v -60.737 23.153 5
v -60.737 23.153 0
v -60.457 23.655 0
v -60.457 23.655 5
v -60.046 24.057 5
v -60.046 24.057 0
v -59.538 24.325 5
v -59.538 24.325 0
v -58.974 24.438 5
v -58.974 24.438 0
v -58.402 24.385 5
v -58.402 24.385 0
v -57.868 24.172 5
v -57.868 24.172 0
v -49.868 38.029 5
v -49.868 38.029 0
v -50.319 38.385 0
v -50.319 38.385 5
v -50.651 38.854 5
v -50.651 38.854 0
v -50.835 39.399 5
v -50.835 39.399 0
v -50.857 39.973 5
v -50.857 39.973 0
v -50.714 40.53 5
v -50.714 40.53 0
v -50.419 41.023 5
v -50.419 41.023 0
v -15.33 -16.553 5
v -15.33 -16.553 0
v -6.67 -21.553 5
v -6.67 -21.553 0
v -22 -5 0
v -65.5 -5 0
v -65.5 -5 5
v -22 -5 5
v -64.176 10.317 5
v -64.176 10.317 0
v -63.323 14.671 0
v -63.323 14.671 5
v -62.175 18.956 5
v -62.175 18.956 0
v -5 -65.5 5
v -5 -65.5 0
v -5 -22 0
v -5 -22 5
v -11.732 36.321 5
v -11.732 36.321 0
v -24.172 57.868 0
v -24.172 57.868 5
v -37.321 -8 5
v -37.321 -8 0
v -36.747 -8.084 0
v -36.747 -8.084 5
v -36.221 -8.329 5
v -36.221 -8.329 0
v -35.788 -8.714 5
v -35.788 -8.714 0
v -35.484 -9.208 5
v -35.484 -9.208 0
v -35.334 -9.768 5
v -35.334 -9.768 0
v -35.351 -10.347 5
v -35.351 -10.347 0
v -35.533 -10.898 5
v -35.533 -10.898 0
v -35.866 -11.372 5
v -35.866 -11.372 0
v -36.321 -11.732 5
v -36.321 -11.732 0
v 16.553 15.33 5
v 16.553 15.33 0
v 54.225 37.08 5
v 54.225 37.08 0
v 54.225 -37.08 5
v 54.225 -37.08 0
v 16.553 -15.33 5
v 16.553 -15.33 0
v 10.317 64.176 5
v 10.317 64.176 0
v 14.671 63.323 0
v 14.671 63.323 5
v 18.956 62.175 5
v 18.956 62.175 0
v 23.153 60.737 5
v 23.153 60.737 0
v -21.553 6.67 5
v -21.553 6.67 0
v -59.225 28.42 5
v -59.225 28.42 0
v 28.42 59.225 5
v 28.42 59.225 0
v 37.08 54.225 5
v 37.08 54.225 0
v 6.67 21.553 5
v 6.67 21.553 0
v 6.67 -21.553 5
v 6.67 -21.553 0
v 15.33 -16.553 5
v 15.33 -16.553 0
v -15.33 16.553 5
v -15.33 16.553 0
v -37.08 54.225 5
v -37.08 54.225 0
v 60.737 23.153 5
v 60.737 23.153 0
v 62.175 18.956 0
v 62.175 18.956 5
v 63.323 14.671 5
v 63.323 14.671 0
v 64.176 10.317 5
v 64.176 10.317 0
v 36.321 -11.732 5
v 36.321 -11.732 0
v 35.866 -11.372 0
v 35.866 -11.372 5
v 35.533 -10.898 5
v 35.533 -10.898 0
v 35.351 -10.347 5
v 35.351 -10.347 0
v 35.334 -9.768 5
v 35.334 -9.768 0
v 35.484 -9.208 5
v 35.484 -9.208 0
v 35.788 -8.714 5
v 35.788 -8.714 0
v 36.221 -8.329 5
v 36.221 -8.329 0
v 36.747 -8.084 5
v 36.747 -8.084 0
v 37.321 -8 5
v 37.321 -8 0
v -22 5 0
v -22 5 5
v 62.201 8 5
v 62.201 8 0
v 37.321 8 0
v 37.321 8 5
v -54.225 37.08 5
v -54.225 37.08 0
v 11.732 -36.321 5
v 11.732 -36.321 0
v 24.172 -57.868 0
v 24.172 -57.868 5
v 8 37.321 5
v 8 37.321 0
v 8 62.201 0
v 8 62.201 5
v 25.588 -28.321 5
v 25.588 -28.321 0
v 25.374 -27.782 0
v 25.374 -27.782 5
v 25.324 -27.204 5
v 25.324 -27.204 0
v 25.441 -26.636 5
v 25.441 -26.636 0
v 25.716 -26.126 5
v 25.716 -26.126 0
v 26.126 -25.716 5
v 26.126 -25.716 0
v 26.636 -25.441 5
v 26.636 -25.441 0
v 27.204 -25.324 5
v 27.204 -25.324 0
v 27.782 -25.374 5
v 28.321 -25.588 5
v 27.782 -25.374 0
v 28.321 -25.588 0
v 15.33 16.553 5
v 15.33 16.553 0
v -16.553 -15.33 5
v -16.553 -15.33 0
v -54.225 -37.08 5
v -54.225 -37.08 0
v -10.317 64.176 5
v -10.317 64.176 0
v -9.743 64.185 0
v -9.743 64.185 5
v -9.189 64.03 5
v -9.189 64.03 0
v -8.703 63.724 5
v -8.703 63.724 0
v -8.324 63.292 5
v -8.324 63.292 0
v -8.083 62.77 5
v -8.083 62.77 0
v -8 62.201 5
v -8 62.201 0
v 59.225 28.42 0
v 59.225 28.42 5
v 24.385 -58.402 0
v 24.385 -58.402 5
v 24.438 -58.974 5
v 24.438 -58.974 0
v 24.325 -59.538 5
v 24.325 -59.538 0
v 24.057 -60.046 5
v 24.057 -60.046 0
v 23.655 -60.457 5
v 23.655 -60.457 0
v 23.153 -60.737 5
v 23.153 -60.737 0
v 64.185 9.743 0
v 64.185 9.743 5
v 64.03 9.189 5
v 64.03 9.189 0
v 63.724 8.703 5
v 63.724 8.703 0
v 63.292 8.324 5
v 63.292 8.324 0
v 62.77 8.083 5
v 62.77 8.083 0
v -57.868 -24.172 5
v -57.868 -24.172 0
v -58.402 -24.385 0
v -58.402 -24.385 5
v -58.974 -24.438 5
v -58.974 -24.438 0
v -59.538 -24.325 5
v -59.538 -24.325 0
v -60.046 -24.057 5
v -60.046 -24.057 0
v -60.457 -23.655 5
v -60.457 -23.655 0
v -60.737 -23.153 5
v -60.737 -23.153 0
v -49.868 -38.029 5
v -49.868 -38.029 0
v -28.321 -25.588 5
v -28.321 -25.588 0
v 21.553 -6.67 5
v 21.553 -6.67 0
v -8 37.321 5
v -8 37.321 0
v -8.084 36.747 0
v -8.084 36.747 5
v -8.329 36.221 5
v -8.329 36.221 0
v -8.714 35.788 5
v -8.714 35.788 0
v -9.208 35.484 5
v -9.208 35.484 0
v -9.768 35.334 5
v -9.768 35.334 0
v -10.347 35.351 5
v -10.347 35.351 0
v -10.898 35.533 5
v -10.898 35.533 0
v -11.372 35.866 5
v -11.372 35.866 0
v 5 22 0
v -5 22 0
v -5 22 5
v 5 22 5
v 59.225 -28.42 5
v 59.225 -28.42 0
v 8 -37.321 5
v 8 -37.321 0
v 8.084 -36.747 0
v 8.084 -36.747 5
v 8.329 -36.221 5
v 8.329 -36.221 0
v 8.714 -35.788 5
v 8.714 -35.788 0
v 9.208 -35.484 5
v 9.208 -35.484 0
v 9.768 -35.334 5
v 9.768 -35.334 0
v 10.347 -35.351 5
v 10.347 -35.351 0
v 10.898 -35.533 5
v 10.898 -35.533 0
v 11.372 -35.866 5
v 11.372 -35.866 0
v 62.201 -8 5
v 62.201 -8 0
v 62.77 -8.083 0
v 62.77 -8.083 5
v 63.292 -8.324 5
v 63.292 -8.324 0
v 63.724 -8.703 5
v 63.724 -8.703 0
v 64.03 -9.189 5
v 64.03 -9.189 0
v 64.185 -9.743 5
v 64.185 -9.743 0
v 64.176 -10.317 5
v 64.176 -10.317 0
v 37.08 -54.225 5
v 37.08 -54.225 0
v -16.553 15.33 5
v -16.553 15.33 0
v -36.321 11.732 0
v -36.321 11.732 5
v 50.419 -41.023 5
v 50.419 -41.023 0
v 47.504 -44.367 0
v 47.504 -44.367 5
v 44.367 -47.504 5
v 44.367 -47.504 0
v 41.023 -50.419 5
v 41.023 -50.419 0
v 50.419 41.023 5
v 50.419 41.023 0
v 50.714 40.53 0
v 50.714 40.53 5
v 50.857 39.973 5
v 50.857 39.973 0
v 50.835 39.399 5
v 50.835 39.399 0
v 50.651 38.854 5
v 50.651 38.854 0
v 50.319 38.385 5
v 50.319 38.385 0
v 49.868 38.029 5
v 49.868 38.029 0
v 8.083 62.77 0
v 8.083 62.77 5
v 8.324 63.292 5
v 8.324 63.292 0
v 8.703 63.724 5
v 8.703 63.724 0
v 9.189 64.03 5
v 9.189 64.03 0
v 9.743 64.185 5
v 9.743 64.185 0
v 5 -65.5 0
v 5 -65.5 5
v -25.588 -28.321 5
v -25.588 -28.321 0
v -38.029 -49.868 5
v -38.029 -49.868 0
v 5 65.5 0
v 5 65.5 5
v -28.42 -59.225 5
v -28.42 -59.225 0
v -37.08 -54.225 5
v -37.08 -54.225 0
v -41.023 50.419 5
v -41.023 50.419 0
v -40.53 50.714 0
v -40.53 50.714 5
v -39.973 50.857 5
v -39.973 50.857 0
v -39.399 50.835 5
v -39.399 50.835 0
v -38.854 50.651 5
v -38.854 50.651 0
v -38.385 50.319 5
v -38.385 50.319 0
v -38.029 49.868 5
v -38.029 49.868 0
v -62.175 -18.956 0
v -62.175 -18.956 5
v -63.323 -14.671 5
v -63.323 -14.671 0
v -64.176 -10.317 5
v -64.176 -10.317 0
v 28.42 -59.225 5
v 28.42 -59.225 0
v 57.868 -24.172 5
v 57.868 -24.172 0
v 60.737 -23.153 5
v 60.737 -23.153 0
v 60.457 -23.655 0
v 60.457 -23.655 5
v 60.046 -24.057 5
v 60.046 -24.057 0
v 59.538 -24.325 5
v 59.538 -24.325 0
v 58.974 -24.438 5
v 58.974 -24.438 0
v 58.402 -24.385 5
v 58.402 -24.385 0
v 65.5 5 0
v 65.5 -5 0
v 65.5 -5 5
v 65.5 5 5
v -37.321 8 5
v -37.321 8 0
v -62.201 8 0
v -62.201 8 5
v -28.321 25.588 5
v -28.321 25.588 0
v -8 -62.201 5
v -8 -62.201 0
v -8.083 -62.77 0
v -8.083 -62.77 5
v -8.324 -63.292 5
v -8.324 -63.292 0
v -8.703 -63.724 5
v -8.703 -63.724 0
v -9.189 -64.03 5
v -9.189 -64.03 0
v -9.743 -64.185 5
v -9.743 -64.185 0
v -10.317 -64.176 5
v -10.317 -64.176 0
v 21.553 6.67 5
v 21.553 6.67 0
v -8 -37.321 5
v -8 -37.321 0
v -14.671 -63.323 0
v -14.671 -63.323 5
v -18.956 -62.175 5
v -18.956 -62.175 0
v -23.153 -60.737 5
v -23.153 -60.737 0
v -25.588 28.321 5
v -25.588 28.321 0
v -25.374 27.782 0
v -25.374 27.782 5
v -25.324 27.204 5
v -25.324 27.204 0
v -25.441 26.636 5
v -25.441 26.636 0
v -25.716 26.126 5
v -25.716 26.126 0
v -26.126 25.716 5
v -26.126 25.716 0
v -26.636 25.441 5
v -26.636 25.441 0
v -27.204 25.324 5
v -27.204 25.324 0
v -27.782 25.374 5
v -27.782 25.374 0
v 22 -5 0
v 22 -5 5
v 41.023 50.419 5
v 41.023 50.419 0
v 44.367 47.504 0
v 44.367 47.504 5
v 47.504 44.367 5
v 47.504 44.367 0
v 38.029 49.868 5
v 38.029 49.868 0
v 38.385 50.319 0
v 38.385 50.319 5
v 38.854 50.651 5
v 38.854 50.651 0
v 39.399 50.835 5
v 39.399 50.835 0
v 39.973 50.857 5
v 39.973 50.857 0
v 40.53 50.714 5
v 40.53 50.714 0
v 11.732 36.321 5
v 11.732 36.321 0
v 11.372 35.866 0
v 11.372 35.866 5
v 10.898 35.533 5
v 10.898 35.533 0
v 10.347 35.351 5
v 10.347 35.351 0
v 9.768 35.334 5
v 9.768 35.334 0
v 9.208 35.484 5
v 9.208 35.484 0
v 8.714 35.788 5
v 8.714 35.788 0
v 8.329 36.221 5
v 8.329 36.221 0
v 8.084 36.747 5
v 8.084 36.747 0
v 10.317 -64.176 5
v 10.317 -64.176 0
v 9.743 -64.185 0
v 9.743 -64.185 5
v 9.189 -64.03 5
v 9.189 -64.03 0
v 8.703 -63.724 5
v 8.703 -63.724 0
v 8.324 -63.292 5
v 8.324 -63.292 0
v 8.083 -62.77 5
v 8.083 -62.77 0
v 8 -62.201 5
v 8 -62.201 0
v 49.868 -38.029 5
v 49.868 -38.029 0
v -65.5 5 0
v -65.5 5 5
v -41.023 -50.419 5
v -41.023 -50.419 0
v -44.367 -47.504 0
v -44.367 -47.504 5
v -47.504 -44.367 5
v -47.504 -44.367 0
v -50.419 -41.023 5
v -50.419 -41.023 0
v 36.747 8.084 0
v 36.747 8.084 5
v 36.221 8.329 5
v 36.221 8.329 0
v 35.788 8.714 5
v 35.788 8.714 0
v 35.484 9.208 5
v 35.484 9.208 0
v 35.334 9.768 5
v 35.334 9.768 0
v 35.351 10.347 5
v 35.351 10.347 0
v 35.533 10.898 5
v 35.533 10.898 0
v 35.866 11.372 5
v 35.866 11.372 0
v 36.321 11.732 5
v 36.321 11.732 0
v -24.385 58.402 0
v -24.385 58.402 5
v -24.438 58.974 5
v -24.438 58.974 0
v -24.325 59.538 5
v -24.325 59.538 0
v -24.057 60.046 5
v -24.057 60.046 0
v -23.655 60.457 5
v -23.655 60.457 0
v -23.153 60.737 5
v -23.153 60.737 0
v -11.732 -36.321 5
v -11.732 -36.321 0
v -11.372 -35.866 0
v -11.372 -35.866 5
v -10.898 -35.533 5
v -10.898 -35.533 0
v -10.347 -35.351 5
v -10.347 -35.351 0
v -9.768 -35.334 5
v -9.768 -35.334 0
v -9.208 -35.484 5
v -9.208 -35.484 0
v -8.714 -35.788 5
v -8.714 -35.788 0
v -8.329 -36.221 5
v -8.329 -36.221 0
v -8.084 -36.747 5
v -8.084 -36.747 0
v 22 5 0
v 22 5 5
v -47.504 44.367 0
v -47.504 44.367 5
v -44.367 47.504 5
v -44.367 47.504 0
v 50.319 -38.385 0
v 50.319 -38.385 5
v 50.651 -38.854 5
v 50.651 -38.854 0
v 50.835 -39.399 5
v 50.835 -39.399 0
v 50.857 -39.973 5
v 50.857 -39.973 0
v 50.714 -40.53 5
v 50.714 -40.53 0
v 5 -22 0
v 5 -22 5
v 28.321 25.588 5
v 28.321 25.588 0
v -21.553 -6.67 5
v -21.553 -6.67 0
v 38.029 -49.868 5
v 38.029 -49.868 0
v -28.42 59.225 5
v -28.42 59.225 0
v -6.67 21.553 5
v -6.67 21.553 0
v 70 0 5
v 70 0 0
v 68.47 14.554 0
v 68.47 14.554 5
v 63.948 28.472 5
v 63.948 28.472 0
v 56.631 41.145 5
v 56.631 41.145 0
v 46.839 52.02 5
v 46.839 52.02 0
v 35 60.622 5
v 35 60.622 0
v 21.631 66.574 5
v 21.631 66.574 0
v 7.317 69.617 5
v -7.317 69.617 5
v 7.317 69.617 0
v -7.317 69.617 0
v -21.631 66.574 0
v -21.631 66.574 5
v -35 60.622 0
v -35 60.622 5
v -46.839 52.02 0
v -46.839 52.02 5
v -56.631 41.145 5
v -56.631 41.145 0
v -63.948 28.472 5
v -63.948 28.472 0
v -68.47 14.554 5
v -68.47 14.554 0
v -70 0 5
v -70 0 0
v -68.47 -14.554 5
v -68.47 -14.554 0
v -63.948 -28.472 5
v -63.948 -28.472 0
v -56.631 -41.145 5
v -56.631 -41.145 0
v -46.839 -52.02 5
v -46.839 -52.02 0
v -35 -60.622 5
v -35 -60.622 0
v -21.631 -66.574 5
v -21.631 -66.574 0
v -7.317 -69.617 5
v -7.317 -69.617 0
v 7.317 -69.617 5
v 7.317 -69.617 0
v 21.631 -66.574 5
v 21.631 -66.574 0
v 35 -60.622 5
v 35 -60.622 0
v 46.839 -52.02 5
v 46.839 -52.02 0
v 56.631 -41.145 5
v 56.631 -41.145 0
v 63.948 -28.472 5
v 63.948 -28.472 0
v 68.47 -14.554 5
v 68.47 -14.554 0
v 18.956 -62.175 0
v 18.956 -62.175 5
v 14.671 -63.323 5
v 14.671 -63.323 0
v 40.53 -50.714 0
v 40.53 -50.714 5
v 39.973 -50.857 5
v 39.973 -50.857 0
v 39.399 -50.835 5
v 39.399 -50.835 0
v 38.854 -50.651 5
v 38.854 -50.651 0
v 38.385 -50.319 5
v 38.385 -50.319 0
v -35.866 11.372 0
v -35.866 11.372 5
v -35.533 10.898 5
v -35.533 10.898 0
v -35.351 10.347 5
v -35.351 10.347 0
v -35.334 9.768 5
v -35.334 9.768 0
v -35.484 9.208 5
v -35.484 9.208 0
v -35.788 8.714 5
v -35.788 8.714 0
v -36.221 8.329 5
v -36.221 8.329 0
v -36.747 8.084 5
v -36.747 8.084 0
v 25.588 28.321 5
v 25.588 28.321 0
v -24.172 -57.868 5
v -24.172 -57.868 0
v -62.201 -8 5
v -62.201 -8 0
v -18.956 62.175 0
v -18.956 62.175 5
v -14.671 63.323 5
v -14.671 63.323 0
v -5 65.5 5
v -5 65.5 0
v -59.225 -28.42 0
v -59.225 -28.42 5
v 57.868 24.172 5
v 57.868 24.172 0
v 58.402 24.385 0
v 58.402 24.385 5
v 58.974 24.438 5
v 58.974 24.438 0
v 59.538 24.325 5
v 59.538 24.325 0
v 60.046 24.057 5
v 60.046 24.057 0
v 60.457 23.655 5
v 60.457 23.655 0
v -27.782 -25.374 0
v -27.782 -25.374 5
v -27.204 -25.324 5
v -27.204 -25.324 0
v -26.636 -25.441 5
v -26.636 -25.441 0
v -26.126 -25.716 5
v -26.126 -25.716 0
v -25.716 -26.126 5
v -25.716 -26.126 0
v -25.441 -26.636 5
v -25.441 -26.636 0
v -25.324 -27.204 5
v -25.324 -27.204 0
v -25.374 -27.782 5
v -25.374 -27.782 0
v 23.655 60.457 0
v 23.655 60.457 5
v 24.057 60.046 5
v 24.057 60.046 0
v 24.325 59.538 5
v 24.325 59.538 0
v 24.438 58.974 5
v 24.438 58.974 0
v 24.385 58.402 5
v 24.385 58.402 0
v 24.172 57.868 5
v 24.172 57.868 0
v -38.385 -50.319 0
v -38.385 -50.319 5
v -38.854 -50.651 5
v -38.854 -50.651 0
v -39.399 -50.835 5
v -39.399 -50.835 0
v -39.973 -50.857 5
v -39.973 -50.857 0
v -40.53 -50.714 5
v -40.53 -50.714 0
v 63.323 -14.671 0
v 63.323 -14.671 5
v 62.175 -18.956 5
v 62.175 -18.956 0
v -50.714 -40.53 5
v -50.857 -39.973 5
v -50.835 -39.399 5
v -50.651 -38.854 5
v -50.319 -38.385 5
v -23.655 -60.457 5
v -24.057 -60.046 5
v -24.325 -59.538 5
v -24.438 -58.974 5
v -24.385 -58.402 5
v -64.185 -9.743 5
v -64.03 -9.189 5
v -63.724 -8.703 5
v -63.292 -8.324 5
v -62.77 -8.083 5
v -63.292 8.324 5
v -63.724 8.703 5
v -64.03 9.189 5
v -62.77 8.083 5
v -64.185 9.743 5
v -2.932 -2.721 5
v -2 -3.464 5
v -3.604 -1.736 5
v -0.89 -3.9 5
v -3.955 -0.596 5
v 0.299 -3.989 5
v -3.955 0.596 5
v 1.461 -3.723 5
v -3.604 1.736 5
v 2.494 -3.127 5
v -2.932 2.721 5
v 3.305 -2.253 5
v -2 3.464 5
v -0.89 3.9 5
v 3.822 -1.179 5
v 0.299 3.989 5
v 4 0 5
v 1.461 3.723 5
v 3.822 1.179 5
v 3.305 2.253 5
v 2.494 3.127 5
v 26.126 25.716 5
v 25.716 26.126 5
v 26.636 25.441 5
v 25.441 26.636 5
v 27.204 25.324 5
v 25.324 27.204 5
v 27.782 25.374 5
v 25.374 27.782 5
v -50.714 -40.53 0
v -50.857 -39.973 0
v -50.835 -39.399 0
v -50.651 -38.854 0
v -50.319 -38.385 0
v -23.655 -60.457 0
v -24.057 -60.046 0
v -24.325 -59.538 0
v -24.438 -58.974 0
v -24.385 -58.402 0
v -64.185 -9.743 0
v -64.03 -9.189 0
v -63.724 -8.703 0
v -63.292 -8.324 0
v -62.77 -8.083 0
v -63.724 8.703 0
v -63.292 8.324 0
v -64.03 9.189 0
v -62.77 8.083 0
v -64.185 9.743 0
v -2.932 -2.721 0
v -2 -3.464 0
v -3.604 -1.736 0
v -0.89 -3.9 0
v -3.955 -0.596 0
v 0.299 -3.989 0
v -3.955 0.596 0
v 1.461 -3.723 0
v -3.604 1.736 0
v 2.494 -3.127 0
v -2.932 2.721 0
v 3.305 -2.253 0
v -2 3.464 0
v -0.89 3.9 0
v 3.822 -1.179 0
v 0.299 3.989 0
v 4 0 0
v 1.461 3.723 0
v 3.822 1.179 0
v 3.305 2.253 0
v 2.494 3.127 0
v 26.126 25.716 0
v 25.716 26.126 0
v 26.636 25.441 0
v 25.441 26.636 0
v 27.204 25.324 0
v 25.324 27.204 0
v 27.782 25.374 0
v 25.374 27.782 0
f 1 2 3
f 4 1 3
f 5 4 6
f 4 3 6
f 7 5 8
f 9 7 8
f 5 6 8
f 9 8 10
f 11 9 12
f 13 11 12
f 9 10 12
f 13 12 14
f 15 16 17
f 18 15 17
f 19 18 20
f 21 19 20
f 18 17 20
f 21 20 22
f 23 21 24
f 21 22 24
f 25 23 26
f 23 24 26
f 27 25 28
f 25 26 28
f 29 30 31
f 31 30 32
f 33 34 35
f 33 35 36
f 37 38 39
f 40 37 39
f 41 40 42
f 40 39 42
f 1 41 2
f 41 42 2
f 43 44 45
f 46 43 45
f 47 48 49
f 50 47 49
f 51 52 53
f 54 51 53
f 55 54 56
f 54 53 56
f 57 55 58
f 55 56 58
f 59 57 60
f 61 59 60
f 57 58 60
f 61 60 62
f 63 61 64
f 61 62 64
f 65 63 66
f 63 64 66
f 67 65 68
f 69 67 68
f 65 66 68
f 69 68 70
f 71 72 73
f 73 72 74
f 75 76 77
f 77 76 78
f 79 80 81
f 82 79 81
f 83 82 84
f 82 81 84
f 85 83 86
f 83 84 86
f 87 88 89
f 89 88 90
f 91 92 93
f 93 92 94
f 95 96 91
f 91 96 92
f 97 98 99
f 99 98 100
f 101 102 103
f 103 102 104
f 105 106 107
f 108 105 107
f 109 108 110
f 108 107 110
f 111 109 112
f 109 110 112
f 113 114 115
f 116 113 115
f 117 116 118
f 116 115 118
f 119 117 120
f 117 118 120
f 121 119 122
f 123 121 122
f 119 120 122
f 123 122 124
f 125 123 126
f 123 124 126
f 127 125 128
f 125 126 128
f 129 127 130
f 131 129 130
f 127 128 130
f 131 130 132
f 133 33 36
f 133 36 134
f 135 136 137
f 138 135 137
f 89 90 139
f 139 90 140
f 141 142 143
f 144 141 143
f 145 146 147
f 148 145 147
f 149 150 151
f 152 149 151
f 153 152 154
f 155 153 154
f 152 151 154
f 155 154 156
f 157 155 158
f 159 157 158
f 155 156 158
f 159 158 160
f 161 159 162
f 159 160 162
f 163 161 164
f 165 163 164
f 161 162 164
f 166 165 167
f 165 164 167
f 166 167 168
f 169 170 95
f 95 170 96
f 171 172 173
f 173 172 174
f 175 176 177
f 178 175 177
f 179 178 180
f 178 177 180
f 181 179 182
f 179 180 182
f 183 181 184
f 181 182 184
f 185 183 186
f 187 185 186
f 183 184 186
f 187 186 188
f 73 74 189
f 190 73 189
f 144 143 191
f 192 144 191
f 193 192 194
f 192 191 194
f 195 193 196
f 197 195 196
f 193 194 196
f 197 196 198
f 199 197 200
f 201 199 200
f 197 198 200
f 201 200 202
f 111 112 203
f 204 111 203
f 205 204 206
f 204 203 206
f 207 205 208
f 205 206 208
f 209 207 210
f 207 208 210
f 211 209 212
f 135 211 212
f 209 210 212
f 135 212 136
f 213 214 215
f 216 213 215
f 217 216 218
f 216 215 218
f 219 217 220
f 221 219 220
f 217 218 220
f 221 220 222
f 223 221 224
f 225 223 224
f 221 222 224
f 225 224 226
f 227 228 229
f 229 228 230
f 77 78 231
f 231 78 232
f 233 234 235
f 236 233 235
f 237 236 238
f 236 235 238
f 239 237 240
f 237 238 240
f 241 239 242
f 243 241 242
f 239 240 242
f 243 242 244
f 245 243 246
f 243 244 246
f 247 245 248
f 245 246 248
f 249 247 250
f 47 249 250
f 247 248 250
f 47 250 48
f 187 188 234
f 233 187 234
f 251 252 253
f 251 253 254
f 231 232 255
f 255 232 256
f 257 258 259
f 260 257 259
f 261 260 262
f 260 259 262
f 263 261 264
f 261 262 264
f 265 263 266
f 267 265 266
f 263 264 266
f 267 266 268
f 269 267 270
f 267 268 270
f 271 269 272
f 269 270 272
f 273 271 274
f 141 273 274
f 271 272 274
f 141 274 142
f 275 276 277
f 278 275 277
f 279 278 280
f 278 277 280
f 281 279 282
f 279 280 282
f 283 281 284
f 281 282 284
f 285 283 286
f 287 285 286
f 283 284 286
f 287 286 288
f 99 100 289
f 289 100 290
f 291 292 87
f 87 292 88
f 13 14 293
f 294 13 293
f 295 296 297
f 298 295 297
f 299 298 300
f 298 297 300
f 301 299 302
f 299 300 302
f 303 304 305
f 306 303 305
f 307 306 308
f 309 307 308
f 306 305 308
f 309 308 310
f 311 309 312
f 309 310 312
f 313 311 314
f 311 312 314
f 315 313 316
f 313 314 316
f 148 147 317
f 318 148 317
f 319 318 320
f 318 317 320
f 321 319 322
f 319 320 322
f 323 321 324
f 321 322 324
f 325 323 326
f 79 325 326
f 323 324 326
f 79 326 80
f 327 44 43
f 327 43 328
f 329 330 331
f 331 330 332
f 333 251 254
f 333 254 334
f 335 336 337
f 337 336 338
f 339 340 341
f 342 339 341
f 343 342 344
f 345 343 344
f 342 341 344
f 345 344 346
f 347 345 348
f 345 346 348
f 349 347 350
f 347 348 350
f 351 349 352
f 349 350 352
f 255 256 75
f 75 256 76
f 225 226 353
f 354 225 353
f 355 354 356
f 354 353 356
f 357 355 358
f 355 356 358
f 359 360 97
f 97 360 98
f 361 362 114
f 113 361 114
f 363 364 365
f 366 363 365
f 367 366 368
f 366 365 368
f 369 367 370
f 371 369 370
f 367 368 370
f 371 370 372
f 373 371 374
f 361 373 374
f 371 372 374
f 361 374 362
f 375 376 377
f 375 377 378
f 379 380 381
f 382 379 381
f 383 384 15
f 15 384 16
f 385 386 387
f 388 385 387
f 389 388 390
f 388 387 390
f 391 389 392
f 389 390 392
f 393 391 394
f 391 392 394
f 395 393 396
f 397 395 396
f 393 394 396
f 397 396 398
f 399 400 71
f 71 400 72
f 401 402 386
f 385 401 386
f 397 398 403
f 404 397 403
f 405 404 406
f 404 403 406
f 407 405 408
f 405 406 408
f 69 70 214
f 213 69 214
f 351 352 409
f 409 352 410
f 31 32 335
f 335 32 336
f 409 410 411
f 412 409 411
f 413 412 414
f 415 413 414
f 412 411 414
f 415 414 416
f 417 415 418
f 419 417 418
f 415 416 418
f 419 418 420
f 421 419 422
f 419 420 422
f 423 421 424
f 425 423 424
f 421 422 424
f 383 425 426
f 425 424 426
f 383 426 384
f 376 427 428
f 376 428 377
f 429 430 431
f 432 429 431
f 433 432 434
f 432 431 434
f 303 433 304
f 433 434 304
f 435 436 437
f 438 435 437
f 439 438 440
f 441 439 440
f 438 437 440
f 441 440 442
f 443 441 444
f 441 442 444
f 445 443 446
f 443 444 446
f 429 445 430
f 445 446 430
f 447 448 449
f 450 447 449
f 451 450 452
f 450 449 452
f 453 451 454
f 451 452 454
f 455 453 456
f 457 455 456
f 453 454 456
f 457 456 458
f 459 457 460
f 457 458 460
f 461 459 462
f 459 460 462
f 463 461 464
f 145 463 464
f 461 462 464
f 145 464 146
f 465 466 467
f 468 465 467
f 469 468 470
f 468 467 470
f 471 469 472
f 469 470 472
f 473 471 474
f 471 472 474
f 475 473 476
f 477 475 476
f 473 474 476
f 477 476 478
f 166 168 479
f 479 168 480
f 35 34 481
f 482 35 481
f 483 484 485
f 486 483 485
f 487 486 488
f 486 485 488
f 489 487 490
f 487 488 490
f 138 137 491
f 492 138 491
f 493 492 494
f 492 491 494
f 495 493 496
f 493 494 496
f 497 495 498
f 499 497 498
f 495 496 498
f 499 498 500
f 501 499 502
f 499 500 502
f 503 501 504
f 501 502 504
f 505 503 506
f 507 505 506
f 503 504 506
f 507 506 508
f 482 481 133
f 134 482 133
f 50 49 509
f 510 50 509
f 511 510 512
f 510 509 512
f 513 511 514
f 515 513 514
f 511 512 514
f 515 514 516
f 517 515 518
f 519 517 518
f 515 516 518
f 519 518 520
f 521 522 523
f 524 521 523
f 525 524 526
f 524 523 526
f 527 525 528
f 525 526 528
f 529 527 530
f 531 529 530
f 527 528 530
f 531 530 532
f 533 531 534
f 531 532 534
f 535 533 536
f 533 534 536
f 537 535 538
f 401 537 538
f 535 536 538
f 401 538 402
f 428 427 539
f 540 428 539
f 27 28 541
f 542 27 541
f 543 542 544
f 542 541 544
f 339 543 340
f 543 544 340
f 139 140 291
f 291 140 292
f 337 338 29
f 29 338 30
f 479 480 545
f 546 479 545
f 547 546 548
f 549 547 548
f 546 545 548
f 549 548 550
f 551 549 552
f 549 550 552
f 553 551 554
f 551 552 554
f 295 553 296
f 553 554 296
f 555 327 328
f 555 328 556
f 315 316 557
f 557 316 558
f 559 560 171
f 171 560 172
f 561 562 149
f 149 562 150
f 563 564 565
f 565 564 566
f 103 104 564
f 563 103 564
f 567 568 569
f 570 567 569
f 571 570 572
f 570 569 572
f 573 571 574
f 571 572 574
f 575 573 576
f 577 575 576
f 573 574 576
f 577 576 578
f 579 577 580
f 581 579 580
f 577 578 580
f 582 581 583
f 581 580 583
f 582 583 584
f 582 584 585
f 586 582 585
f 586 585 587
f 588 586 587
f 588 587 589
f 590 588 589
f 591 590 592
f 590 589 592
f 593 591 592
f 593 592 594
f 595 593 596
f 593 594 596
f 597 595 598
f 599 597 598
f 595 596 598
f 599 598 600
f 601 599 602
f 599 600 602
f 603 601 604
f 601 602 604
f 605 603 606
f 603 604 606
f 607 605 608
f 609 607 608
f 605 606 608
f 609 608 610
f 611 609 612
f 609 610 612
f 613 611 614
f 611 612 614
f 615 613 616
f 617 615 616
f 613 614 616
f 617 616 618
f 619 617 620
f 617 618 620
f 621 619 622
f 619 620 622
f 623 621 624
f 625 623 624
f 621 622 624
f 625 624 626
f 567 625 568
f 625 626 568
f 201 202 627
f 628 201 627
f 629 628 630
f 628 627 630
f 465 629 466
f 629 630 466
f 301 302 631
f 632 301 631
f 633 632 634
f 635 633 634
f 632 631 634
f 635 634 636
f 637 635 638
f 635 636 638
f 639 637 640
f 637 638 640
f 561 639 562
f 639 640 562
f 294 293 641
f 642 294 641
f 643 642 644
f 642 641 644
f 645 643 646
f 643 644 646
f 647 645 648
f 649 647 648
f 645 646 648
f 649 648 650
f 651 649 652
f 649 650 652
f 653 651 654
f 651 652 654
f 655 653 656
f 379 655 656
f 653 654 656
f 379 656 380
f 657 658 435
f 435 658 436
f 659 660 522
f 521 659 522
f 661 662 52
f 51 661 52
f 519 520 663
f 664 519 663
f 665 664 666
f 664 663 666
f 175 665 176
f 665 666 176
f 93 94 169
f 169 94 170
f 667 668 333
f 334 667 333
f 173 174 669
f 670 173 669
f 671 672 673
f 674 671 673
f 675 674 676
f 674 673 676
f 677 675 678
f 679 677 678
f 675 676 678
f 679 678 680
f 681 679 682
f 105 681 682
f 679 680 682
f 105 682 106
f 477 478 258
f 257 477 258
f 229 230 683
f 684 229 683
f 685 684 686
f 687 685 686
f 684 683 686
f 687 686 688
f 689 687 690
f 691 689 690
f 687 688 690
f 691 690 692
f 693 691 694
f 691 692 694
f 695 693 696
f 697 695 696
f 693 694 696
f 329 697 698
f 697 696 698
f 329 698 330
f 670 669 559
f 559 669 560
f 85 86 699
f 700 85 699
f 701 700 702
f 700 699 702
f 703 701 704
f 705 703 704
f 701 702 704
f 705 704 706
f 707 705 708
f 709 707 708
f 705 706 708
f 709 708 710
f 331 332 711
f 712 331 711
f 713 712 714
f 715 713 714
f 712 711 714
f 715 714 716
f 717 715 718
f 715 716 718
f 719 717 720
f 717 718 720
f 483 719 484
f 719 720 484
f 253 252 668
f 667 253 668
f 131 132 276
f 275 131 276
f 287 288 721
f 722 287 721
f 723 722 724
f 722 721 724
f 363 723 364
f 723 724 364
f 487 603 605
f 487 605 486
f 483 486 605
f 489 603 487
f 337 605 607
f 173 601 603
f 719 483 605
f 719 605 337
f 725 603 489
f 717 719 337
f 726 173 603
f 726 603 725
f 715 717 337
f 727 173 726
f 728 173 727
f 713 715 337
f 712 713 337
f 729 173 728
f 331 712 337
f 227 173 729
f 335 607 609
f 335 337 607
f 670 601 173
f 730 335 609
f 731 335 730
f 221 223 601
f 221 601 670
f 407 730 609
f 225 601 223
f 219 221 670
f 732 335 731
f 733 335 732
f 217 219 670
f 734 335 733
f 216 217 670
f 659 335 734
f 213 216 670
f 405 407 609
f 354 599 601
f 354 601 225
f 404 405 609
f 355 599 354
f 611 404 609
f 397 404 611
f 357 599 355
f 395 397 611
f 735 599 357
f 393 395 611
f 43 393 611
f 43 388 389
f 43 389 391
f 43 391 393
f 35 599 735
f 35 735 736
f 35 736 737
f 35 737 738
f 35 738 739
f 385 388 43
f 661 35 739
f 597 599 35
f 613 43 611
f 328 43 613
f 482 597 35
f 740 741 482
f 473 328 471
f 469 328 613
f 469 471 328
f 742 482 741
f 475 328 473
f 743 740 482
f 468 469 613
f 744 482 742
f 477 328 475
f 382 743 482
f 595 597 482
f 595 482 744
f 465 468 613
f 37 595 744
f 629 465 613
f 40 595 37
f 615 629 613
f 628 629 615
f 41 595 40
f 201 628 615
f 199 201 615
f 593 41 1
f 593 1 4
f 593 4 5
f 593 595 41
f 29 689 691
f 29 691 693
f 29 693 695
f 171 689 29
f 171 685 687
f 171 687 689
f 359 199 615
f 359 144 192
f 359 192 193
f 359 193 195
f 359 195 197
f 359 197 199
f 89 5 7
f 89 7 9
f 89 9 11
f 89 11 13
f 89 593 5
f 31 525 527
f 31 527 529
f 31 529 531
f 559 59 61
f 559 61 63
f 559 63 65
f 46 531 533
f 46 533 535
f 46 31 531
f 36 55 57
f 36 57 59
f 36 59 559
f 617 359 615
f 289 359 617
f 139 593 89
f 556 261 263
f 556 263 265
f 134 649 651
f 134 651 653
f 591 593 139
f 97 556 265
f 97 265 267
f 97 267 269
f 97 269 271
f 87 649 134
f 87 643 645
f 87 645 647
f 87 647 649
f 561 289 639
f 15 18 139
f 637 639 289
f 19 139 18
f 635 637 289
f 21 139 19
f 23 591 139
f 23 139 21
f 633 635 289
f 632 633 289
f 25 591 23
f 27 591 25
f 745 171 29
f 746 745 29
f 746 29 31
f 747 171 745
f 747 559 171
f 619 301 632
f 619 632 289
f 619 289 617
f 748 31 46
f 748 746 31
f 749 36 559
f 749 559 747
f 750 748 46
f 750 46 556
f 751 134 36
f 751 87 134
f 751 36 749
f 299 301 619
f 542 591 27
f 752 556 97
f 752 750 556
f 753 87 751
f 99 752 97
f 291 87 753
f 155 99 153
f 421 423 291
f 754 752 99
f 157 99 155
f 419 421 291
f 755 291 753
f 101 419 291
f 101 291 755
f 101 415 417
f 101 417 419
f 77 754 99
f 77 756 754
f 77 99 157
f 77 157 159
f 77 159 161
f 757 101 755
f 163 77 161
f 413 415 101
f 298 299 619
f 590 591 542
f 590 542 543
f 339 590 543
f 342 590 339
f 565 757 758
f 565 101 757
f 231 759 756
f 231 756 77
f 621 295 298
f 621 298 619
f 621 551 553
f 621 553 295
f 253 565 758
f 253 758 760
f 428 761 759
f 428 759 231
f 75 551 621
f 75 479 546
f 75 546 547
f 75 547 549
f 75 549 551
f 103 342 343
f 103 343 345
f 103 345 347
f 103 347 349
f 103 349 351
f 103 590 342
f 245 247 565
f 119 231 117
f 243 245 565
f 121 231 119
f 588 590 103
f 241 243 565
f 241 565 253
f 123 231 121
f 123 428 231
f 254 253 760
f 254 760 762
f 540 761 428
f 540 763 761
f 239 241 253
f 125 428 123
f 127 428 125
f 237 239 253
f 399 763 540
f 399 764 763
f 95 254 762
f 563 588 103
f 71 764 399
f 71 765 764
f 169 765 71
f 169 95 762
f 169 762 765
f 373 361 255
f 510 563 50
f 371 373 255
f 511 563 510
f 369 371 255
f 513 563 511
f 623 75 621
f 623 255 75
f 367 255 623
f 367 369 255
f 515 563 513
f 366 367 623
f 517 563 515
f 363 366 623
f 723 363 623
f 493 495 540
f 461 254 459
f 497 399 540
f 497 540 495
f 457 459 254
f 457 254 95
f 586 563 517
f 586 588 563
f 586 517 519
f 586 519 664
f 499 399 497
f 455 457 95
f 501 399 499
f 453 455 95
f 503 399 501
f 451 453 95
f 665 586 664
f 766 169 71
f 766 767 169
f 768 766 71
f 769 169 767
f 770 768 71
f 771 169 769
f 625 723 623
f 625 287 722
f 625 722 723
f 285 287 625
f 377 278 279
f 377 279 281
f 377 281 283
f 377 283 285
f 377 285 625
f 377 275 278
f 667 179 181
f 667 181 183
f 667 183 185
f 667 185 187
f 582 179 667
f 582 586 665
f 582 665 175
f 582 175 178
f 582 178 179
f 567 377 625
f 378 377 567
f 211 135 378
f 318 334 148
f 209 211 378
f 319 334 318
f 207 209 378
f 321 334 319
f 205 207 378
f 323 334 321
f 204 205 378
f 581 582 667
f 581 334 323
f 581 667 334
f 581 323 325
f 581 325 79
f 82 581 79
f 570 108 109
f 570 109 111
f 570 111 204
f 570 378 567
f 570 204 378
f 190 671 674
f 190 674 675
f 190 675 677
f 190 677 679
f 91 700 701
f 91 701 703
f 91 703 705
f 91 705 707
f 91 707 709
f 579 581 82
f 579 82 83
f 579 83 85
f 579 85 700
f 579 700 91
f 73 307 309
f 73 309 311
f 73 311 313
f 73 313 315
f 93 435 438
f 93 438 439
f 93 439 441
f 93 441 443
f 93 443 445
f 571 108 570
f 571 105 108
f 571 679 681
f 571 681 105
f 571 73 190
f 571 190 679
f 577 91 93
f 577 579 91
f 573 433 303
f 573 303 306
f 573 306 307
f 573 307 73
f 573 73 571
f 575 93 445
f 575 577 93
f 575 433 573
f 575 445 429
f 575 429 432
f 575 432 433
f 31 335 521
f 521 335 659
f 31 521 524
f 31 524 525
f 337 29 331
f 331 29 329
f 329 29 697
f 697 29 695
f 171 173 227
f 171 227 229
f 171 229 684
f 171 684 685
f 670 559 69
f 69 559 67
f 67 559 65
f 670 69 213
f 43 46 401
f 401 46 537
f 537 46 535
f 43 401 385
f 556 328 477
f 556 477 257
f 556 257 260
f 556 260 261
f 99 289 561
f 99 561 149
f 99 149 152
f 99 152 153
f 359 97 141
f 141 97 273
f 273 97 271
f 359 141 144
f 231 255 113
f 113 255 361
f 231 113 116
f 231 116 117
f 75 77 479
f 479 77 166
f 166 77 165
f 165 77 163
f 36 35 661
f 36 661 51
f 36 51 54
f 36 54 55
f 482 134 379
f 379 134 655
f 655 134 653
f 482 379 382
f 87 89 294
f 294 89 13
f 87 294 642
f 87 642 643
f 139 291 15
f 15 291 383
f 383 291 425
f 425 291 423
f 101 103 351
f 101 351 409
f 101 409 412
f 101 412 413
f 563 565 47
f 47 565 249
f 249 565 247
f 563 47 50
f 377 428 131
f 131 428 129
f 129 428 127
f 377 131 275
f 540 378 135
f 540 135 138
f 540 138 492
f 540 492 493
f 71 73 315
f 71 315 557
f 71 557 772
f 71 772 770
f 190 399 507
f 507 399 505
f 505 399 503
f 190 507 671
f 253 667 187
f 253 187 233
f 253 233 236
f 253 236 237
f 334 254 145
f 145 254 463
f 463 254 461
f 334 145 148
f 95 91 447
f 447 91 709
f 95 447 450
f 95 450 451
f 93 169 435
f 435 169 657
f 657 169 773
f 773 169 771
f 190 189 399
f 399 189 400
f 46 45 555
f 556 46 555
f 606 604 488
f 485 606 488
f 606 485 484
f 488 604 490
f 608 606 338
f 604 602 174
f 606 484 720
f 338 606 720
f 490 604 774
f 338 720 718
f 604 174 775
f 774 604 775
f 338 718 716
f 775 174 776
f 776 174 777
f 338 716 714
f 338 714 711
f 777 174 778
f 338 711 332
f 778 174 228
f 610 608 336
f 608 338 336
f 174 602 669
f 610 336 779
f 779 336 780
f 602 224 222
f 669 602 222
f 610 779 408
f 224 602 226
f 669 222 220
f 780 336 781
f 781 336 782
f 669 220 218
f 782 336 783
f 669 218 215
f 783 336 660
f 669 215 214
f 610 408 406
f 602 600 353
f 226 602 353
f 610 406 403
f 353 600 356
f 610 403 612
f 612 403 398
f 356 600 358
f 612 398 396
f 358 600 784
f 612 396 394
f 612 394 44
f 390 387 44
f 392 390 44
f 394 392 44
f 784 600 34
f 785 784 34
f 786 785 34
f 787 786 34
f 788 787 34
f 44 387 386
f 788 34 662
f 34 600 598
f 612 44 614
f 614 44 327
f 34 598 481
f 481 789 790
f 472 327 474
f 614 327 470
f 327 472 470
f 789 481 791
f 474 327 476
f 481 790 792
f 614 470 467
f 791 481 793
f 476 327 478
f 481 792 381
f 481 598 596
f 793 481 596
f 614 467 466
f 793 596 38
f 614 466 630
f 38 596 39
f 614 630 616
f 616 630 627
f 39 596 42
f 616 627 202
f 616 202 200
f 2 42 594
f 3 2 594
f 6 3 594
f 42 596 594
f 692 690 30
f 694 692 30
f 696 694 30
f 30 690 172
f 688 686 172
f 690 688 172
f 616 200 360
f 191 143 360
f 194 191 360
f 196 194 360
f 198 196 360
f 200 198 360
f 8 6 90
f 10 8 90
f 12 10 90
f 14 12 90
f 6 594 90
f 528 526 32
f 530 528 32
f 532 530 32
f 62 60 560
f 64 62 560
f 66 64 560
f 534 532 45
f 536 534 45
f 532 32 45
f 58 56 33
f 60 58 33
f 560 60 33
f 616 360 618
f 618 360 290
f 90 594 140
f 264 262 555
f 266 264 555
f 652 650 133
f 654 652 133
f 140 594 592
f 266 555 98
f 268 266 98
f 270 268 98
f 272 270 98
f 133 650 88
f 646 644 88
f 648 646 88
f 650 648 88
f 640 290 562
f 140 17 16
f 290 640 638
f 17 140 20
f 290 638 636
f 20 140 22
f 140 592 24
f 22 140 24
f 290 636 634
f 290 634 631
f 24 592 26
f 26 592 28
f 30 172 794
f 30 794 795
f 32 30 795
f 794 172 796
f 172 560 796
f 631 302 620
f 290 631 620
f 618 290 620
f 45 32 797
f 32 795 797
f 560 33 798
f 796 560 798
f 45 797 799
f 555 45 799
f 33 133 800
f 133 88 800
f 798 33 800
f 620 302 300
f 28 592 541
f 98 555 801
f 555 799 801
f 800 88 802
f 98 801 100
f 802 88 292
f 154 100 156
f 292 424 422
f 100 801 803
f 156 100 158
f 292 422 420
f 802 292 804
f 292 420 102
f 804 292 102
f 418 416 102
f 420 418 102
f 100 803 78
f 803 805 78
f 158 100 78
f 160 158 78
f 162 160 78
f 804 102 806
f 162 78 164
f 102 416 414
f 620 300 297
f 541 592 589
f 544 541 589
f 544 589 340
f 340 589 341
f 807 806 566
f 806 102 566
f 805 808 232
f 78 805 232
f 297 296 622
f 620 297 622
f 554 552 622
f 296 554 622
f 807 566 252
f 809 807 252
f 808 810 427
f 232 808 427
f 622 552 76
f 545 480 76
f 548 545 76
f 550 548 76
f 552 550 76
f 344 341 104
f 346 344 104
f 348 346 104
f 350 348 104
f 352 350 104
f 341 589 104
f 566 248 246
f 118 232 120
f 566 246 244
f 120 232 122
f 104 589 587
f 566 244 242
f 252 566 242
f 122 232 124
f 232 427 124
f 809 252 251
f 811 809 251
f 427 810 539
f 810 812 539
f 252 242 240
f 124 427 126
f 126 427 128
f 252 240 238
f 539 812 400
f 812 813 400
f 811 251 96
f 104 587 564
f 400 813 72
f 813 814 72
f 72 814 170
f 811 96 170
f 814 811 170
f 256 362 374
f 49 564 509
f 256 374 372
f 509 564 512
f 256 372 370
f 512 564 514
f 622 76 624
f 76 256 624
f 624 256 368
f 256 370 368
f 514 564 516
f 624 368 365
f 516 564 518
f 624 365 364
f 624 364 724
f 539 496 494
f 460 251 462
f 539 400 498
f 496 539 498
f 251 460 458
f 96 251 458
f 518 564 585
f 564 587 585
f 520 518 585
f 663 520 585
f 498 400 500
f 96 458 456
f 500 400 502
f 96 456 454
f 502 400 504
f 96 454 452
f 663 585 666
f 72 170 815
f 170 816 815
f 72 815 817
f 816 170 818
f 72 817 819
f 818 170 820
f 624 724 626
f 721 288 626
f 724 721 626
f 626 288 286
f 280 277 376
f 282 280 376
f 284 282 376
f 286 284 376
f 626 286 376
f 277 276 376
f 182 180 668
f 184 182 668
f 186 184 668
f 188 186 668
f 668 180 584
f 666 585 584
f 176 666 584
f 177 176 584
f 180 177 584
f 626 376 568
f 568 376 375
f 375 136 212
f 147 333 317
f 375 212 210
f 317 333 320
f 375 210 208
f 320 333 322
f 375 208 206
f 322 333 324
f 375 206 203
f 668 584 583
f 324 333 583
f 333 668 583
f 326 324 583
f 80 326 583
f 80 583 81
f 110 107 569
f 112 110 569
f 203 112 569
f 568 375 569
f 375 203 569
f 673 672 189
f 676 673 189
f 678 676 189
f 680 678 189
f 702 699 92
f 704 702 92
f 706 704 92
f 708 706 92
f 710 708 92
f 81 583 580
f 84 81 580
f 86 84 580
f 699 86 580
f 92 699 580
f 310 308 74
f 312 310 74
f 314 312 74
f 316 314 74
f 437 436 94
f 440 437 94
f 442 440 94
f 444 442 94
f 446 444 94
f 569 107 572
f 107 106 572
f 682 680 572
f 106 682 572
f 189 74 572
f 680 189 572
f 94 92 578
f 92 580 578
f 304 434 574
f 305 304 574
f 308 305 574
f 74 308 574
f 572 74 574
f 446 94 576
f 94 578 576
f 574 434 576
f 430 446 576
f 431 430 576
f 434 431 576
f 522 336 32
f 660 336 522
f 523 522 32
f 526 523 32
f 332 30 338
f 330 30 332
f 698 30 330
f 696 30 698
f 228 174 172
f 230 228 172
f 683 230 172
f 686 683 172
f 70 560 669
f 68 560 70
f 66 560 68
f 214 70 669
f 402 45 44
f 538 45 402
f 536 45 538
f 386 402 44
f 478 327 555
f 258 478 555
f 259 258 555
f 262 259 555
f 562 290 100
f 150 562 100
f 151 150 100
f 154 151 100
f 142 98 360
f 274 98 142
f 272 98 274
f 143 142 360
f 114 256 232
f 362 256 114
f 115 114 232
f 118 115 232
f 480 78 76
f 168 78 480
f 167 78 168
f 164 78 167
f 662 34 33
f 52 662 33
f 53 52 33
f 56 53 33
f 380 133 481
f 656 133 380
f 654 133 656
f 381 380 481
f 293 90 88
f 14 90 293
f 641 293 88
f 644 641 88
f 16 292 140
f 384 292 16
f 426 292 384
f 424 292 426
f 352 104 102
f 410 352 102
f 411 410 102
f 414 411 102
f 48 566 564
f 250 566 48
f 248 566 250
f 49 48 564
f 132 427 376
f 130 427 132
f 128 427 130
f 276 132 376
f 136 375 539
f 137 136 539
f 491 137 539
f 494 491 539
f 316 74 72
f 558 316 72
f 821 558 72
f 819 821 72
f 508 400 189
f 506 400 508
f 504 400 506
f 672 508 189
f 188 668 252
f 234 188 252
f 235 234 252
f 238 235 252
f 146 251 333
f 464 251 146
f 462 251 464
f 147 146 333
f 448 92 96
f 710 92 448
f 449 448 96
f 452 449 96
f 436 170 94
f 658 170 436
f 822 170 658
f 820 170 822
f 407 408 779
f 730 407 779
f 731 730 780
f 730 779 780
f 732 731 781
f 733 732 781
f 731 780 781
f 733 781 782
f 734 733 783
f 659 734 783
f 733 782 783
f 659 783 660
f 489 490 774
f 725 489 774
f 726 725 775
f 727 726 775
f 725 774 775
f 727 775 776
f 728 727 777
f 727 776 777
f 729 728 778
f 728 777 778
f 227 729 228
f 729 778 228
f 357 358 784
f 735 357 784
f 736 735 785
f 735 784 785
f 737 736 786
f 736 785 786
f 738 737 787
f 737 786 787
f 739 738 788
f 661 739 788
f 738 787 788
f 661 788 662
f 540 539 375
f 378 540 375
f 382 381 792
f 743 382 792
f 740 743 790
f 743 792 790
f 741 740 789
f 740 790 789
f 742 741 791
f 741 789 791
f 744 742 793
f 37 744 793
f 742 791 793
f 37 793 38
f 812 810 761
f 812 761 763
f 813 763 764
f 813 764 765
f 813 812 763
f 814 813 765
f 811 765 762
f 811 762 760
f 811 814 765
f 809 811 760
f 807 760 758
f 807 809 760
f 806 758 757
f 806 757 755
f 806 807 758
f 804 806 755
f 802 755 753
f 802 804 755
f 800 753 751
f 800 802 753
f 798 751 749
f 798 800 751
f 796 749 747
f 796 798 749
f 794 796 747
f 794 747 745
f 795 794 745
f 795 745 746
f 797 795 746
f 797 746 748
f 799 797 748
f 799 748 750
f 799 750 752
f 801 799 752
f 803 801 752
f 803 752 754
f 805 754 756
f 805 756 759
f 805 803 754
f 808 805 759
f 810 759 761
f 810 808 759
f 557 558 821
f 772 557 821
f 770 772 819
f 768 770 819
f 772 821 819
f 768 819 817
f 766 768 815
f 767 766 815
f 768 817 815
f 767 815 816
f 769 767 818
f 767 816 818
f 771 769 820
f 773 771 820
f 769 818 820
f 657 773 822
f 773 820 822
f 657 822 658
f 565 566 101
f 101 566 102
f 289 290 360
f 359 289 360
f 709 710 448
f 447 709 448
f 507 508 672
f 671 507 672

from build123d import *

# Parameters (mm, degrees)
F0_R     = 70
F0_W     = 10
F0_H     = 43.5
F0_W_2   = 43.5
F0_H_2   = 10
F0_R_2   = 4
F1_DEPTH = 5


with BuildPart() as f1:
    # F0 (on Top) → F1 (new body)
    with BuildSketch(Plane.XY):
        Circle(F0_R)
        with BuildLine():
            ThreePointArc((-50.419256, -41.023148), (-50.834826, -39.398712), (-49.867894, -38.028846))
            Line((-49.867894, -38.028846), (-28.320508, -25.588457))
            ThreePointArc((-28.320508, -25.588457), (-25.906295, -25.906295), (-25.588457, -28.320508))
            Line((-25.588457, -28.320508), (-38.028846, -49.867894))
            ThreePointArc((-38.028846, -49.867894), (-39.398712, -50.834826), (-41.023148, -50.419256))
            ThreePointArc((-41.023148, -50.419256), (-45.961941, -45.961941), (-50.419256, -41.023148))
        make_face(mode=Mode.SUBTRACT)
        Polygon((-6.669873, -21.552559), (-28.419873, -59.224664), (-37.080127, -54.224664), (-15.330127, -16.552559), align=None, mode=Mode.SUBTRACT)
        with BuildLine():
            ThreePointArc((-23.152782, -60.736716), (-24.324895, -59.537699), (-24.17244, -57.867894))
            Line((-24.17244, -57.867894), (-11.732051, -36.320508))
            ThreePointArc((-11.732051, -36.320508), (-9.482362, -35.388656), (-8, -37.320508))
            Line((-8, -37.320508), (-8, -62.201286))
            ThreePointArc((-8, -62.201286), (-8.702873, -63.723607), (-10.31746, -64.17593))
            ThreePointArc((-10.31746, -64.17593), (-16.823238, -62.785179), (-23.152782, -60.736716))
        make_face(mode=Mode.SUBTRACT)
        Polygon((-16.552559, -15.330127), (-54.224664, -37.080127), (-59.224664, -28.419873), (-21.552559, -6.669873), align=None, mode=Mode.SUBTRACT)
        with BuildLine():
            ThreePointArc((-64.17593, -10.31746), (-63.723607, -8.702873), (-62.201286, -8))
            Line((-62.201286, -8), (-37.320508, -8))
            ThreePointArc((-37.320508, -8), (-35.388656, -9.482362), (-36.320508, -11.732051))
            Line((-36.320508, -11.732051), (-57.867894, -24.17244))
            ThreePointArc((-57.867894, -24.17244), (-59.537699, -24.324895), (-60.736716, -23.152782))
            ThreePointArc((-60.736716, -23.152782), (-62.785179, -16.823238), (-64.17593, -10.31746))
        make_face(mode=Mode.SUBTRACT)
        with BuildLine():
            ThreePointArc((10.31746, -64.17593), (8.702873, -63.723607), (8, -62.201286))
            Line((8, -62.201286), (8, -37.320508))
            ThreePointArc((8, -37.320508), (9.482362, -35.388656), (11.732051, -36.320508))
            Line((11.732051, -36.320508), (24.17244, -57.867894))
            ThreePointArc((24.17244, -57.867894), (24.324895, -59.537699), (23.152782, -60.736716))
            ThreePointArc((23.152782, -60.736716), (16.823238, -62.785179), (10.31746, -64.17593))
        make_face(mode=Mode.SUBTRACT)
        with Locations((0, -43.75)):
            Rectangle(F0_W, F0_H, mode=Mode.SUBTRACT)
        Polygon((15.330127, -16.552559), (37.080127, -54.224664), (28.419873, -59.224664), (6.669873, -21.552559), align=None, mode=Mode.SUBTRACT)
        with BuildLine():
            ThreePointArc((41.023148, -50.419256), (39.398712, -50.834826), (38.028846, -49.867894))
            Line((38.028846, -49.867894), (25.588457, -28.320508))
            ThreePointArc((25.588457, -28.320508), (25.906295, -25.906295), (28.320508, -25.588457))
            Line((28.320508, -25.588457), (49.867894, -38.028846))
            ThreePointArc((49.867894, -38.028846), (50.834826, -39.398712), (50.419256, -41.023148))
            ThreePointArc((50.419256, -41.023148), (45.961941, -45.961941), (41.023148, -50.419256))
        make_face(mode=Mode.SUBTRACT)
        Polygon((21.552559, -6.669873), (59.224664, -28.419873), (54.224664, -37.080127), (16.552559, -15.330127), align=None, mode=Mode.SUBTRACT)
        with BuildLine():
            ThreePointArc((60.736716, -23.152782), (59.537699, -24.324895), (57.867894, -24.17244))
            Line((57.867894, -24.17244), (36.320508, -11.732051))
            ThreePointArc((36.320508, -11.732051), (35.388656, -9.482362), (37.320508, -8))
            Line((37.320508, -8), (62.201286, -8))
            ThreePointArc((62.201286, -8), (63.723607, -8.702873), (64.17593, -10.31746))
            ThreePointArc((64.17593, -10.31746), (62.785179, -16.823238), (60.736716, -23.152782))
        make_face(mode=Mode.SUBTRACT)
        with Locations((-43.75, 0)):
            Rectangle(F0_W_2, F0_H_2, mode=Mode.SUBTRACT)
        with BuildLine():
            ThreePointArc((-60.736716, 23.152782), (-59.537699, 24.324895), (-57.867894, 24.17244))
            Line((-57.867894, 24.17244), (-36.320508, 11.732051))
            ThreePointArc((-36.320508, 11.732051), (-35.388656, 9.482362), (-37.320508, 8))
            Line((-37.320508, 8), (-62.201286, 8))
            ThreePointArc((-62.201286, 8), (-63.723607, 8.702873), (-64.17593, 10.31746))
            ThreePointArc((-64.17593, 10.31746), (-62.785179, 16.823238), (-60.736716, 23.152782))
        make_face(mode=Mode.SUBTRACT)
        Polygon((-21.552559, 6.669873), (-59.224664, 28.419873), (-54.224664, 37.080127), (-16.552559, 15.330127), align=None, mode=Mode.SUBTRACT)
        with BuildLine():
            ThreePointArc((-41.023148, 50.419256), (-39.398712, 50.834826), (-38.028846, 49.867894))
            Line((-38.028846, 49.867894), (-25.588457, 28.320508))
            ThreePointArc((-25.588457, 28.320508), (-25.906295, 25.906295), (-28.320508, 25.588457))
            Line((-28.320508, 25.588457), (-49.867894, 38.028846))
            ThreePointArc((-49.867894, 38.028846), (-50.834826, 39.398712), (-50.419256, 41.023148))
            ThreePointArc((-50.419256, 41.023148), (-45.961941, 45.961941), (-41.023148, 50.419256))
        make_face(mode=Mode.SUBTRACT)
        Polygon((-15.330127, 16.552559), (-37.080127, 54.224664), (-28.419873, 59.224664), (-6.669873, 21.552559), align=None, mode=Mode.SUBTRACT)
        with BuildLine():
            Line((-11.732051, 36.320508), (-24.17244, 57.867894))
            ThreePointArc((-24.17244, 57.867894), (-24.324895, 59.537699), (-23.152782, 60.736716))
            ThreePointArc((-23.152782, 60.736716), (-16.823238, 62.785179), (-10.31746, 64.17593))
            ThreePointArc((-10.31746, 64.17593), (-8.702873, 63.723607), (-8, 62.201286))
            Line((-8, 62.201286), (-8, 37.320508))
            ThreePointArc((-8, 37.320508), (-9.482362, 35.388656), (-11.732051, 36.320508))
        make_face(mode=Mode.SUBTRACT)
        Circle(F0_R_2, mode=Mode.SUBTRACT)
        with Locations((43.75, 0)):
            Rectangle(F0_W_2, F0_H_2, mode=Mode.SUBTRACT)
        with BuildLine():
            ThreePointArc((64.17593, 10.31746), (63.723607, 8.702873), (62.201286, 8))
            Line((62.201286, 8), (37.320508, 8))
            ThreePointArc((37.320508, 8), (35.388656, 9.482362), (36.320508, 11.732051))
            Line((36.320508, 11.732051), (57.867894, 24.17244))
            ThreePointArc((57.867894, 24.17244), (59.537699, 24.324895), (60.736716, 23.152782))
            ThreePointArc((60.736716, 23.152782), (62.785179, 16.823238), (64.17593, 10.31746))
        make_face(mode=Mode.SUBTRACT)
        Polygon((16.552559, 15.330127), (54.224664, 37.080127), (59.224664, 28.419873), (21.552559, 6.669873), align=None, mode=Mode.SUBTRACT)
        with Locations((0, 43.75)):
            Rectangle(F0_W, F0_H, mode=Mode.SUBTRACT)
        with BuildLine():
            Line((8, 37.320508), (8, 62.201286))
            ThreePointArc((8, 62.201286), (8.702873, 63.723607), (10.31746, 64.17593))
            ThreePointArc((10.31746, 64.17593), (16.823238, 62.785179), (23.152782, 60.736716))
            ThreePointArc((23.152782, 60.736716), (24.324895, 59.537699), (24.17244, 57.867894))
            Line((24.17244, 57.867894), (11.732051, 36.320508))
            ThreePointArc((11.732051, 36.320508), (9.482362, 35.388656), (8, 37.320508))
        make_face(mode=Mode.SUBTRACT)
        Polygon((6.669873, 21.552559), (28.419873, 59.224664), (37.080127, 54.224664), (15.330127, 16.552559), align=None, mode=Mode.SUBTRACT)
        with BuildLine():
            Line((25.588457, 28.320508), (38.028846, 49.867894))
            ThreePointArc((38.028846, 49.867894), (39.398712, 50.834826), (41.023148, 50.419256))
            ThreePointArc((41.023148, 50.419256), (45.961941, 45.961941), (50.419256, 41.023148))
            ThreePointArc((50.419256, 41.023148), (50.834826, 39.398712), (49.867894, 38.028846))
            Line((49.867894, 38.028846), (28.320508, 25.588457))
            ThreePointArc((28.320508, 25.588457), (25.906295, 25.906295), (25.588457, 28.320508))
        make_face(mode=Mode.SUBTRACT)
    extrude(amount=F1_DEPTH)


solid = f1.part
